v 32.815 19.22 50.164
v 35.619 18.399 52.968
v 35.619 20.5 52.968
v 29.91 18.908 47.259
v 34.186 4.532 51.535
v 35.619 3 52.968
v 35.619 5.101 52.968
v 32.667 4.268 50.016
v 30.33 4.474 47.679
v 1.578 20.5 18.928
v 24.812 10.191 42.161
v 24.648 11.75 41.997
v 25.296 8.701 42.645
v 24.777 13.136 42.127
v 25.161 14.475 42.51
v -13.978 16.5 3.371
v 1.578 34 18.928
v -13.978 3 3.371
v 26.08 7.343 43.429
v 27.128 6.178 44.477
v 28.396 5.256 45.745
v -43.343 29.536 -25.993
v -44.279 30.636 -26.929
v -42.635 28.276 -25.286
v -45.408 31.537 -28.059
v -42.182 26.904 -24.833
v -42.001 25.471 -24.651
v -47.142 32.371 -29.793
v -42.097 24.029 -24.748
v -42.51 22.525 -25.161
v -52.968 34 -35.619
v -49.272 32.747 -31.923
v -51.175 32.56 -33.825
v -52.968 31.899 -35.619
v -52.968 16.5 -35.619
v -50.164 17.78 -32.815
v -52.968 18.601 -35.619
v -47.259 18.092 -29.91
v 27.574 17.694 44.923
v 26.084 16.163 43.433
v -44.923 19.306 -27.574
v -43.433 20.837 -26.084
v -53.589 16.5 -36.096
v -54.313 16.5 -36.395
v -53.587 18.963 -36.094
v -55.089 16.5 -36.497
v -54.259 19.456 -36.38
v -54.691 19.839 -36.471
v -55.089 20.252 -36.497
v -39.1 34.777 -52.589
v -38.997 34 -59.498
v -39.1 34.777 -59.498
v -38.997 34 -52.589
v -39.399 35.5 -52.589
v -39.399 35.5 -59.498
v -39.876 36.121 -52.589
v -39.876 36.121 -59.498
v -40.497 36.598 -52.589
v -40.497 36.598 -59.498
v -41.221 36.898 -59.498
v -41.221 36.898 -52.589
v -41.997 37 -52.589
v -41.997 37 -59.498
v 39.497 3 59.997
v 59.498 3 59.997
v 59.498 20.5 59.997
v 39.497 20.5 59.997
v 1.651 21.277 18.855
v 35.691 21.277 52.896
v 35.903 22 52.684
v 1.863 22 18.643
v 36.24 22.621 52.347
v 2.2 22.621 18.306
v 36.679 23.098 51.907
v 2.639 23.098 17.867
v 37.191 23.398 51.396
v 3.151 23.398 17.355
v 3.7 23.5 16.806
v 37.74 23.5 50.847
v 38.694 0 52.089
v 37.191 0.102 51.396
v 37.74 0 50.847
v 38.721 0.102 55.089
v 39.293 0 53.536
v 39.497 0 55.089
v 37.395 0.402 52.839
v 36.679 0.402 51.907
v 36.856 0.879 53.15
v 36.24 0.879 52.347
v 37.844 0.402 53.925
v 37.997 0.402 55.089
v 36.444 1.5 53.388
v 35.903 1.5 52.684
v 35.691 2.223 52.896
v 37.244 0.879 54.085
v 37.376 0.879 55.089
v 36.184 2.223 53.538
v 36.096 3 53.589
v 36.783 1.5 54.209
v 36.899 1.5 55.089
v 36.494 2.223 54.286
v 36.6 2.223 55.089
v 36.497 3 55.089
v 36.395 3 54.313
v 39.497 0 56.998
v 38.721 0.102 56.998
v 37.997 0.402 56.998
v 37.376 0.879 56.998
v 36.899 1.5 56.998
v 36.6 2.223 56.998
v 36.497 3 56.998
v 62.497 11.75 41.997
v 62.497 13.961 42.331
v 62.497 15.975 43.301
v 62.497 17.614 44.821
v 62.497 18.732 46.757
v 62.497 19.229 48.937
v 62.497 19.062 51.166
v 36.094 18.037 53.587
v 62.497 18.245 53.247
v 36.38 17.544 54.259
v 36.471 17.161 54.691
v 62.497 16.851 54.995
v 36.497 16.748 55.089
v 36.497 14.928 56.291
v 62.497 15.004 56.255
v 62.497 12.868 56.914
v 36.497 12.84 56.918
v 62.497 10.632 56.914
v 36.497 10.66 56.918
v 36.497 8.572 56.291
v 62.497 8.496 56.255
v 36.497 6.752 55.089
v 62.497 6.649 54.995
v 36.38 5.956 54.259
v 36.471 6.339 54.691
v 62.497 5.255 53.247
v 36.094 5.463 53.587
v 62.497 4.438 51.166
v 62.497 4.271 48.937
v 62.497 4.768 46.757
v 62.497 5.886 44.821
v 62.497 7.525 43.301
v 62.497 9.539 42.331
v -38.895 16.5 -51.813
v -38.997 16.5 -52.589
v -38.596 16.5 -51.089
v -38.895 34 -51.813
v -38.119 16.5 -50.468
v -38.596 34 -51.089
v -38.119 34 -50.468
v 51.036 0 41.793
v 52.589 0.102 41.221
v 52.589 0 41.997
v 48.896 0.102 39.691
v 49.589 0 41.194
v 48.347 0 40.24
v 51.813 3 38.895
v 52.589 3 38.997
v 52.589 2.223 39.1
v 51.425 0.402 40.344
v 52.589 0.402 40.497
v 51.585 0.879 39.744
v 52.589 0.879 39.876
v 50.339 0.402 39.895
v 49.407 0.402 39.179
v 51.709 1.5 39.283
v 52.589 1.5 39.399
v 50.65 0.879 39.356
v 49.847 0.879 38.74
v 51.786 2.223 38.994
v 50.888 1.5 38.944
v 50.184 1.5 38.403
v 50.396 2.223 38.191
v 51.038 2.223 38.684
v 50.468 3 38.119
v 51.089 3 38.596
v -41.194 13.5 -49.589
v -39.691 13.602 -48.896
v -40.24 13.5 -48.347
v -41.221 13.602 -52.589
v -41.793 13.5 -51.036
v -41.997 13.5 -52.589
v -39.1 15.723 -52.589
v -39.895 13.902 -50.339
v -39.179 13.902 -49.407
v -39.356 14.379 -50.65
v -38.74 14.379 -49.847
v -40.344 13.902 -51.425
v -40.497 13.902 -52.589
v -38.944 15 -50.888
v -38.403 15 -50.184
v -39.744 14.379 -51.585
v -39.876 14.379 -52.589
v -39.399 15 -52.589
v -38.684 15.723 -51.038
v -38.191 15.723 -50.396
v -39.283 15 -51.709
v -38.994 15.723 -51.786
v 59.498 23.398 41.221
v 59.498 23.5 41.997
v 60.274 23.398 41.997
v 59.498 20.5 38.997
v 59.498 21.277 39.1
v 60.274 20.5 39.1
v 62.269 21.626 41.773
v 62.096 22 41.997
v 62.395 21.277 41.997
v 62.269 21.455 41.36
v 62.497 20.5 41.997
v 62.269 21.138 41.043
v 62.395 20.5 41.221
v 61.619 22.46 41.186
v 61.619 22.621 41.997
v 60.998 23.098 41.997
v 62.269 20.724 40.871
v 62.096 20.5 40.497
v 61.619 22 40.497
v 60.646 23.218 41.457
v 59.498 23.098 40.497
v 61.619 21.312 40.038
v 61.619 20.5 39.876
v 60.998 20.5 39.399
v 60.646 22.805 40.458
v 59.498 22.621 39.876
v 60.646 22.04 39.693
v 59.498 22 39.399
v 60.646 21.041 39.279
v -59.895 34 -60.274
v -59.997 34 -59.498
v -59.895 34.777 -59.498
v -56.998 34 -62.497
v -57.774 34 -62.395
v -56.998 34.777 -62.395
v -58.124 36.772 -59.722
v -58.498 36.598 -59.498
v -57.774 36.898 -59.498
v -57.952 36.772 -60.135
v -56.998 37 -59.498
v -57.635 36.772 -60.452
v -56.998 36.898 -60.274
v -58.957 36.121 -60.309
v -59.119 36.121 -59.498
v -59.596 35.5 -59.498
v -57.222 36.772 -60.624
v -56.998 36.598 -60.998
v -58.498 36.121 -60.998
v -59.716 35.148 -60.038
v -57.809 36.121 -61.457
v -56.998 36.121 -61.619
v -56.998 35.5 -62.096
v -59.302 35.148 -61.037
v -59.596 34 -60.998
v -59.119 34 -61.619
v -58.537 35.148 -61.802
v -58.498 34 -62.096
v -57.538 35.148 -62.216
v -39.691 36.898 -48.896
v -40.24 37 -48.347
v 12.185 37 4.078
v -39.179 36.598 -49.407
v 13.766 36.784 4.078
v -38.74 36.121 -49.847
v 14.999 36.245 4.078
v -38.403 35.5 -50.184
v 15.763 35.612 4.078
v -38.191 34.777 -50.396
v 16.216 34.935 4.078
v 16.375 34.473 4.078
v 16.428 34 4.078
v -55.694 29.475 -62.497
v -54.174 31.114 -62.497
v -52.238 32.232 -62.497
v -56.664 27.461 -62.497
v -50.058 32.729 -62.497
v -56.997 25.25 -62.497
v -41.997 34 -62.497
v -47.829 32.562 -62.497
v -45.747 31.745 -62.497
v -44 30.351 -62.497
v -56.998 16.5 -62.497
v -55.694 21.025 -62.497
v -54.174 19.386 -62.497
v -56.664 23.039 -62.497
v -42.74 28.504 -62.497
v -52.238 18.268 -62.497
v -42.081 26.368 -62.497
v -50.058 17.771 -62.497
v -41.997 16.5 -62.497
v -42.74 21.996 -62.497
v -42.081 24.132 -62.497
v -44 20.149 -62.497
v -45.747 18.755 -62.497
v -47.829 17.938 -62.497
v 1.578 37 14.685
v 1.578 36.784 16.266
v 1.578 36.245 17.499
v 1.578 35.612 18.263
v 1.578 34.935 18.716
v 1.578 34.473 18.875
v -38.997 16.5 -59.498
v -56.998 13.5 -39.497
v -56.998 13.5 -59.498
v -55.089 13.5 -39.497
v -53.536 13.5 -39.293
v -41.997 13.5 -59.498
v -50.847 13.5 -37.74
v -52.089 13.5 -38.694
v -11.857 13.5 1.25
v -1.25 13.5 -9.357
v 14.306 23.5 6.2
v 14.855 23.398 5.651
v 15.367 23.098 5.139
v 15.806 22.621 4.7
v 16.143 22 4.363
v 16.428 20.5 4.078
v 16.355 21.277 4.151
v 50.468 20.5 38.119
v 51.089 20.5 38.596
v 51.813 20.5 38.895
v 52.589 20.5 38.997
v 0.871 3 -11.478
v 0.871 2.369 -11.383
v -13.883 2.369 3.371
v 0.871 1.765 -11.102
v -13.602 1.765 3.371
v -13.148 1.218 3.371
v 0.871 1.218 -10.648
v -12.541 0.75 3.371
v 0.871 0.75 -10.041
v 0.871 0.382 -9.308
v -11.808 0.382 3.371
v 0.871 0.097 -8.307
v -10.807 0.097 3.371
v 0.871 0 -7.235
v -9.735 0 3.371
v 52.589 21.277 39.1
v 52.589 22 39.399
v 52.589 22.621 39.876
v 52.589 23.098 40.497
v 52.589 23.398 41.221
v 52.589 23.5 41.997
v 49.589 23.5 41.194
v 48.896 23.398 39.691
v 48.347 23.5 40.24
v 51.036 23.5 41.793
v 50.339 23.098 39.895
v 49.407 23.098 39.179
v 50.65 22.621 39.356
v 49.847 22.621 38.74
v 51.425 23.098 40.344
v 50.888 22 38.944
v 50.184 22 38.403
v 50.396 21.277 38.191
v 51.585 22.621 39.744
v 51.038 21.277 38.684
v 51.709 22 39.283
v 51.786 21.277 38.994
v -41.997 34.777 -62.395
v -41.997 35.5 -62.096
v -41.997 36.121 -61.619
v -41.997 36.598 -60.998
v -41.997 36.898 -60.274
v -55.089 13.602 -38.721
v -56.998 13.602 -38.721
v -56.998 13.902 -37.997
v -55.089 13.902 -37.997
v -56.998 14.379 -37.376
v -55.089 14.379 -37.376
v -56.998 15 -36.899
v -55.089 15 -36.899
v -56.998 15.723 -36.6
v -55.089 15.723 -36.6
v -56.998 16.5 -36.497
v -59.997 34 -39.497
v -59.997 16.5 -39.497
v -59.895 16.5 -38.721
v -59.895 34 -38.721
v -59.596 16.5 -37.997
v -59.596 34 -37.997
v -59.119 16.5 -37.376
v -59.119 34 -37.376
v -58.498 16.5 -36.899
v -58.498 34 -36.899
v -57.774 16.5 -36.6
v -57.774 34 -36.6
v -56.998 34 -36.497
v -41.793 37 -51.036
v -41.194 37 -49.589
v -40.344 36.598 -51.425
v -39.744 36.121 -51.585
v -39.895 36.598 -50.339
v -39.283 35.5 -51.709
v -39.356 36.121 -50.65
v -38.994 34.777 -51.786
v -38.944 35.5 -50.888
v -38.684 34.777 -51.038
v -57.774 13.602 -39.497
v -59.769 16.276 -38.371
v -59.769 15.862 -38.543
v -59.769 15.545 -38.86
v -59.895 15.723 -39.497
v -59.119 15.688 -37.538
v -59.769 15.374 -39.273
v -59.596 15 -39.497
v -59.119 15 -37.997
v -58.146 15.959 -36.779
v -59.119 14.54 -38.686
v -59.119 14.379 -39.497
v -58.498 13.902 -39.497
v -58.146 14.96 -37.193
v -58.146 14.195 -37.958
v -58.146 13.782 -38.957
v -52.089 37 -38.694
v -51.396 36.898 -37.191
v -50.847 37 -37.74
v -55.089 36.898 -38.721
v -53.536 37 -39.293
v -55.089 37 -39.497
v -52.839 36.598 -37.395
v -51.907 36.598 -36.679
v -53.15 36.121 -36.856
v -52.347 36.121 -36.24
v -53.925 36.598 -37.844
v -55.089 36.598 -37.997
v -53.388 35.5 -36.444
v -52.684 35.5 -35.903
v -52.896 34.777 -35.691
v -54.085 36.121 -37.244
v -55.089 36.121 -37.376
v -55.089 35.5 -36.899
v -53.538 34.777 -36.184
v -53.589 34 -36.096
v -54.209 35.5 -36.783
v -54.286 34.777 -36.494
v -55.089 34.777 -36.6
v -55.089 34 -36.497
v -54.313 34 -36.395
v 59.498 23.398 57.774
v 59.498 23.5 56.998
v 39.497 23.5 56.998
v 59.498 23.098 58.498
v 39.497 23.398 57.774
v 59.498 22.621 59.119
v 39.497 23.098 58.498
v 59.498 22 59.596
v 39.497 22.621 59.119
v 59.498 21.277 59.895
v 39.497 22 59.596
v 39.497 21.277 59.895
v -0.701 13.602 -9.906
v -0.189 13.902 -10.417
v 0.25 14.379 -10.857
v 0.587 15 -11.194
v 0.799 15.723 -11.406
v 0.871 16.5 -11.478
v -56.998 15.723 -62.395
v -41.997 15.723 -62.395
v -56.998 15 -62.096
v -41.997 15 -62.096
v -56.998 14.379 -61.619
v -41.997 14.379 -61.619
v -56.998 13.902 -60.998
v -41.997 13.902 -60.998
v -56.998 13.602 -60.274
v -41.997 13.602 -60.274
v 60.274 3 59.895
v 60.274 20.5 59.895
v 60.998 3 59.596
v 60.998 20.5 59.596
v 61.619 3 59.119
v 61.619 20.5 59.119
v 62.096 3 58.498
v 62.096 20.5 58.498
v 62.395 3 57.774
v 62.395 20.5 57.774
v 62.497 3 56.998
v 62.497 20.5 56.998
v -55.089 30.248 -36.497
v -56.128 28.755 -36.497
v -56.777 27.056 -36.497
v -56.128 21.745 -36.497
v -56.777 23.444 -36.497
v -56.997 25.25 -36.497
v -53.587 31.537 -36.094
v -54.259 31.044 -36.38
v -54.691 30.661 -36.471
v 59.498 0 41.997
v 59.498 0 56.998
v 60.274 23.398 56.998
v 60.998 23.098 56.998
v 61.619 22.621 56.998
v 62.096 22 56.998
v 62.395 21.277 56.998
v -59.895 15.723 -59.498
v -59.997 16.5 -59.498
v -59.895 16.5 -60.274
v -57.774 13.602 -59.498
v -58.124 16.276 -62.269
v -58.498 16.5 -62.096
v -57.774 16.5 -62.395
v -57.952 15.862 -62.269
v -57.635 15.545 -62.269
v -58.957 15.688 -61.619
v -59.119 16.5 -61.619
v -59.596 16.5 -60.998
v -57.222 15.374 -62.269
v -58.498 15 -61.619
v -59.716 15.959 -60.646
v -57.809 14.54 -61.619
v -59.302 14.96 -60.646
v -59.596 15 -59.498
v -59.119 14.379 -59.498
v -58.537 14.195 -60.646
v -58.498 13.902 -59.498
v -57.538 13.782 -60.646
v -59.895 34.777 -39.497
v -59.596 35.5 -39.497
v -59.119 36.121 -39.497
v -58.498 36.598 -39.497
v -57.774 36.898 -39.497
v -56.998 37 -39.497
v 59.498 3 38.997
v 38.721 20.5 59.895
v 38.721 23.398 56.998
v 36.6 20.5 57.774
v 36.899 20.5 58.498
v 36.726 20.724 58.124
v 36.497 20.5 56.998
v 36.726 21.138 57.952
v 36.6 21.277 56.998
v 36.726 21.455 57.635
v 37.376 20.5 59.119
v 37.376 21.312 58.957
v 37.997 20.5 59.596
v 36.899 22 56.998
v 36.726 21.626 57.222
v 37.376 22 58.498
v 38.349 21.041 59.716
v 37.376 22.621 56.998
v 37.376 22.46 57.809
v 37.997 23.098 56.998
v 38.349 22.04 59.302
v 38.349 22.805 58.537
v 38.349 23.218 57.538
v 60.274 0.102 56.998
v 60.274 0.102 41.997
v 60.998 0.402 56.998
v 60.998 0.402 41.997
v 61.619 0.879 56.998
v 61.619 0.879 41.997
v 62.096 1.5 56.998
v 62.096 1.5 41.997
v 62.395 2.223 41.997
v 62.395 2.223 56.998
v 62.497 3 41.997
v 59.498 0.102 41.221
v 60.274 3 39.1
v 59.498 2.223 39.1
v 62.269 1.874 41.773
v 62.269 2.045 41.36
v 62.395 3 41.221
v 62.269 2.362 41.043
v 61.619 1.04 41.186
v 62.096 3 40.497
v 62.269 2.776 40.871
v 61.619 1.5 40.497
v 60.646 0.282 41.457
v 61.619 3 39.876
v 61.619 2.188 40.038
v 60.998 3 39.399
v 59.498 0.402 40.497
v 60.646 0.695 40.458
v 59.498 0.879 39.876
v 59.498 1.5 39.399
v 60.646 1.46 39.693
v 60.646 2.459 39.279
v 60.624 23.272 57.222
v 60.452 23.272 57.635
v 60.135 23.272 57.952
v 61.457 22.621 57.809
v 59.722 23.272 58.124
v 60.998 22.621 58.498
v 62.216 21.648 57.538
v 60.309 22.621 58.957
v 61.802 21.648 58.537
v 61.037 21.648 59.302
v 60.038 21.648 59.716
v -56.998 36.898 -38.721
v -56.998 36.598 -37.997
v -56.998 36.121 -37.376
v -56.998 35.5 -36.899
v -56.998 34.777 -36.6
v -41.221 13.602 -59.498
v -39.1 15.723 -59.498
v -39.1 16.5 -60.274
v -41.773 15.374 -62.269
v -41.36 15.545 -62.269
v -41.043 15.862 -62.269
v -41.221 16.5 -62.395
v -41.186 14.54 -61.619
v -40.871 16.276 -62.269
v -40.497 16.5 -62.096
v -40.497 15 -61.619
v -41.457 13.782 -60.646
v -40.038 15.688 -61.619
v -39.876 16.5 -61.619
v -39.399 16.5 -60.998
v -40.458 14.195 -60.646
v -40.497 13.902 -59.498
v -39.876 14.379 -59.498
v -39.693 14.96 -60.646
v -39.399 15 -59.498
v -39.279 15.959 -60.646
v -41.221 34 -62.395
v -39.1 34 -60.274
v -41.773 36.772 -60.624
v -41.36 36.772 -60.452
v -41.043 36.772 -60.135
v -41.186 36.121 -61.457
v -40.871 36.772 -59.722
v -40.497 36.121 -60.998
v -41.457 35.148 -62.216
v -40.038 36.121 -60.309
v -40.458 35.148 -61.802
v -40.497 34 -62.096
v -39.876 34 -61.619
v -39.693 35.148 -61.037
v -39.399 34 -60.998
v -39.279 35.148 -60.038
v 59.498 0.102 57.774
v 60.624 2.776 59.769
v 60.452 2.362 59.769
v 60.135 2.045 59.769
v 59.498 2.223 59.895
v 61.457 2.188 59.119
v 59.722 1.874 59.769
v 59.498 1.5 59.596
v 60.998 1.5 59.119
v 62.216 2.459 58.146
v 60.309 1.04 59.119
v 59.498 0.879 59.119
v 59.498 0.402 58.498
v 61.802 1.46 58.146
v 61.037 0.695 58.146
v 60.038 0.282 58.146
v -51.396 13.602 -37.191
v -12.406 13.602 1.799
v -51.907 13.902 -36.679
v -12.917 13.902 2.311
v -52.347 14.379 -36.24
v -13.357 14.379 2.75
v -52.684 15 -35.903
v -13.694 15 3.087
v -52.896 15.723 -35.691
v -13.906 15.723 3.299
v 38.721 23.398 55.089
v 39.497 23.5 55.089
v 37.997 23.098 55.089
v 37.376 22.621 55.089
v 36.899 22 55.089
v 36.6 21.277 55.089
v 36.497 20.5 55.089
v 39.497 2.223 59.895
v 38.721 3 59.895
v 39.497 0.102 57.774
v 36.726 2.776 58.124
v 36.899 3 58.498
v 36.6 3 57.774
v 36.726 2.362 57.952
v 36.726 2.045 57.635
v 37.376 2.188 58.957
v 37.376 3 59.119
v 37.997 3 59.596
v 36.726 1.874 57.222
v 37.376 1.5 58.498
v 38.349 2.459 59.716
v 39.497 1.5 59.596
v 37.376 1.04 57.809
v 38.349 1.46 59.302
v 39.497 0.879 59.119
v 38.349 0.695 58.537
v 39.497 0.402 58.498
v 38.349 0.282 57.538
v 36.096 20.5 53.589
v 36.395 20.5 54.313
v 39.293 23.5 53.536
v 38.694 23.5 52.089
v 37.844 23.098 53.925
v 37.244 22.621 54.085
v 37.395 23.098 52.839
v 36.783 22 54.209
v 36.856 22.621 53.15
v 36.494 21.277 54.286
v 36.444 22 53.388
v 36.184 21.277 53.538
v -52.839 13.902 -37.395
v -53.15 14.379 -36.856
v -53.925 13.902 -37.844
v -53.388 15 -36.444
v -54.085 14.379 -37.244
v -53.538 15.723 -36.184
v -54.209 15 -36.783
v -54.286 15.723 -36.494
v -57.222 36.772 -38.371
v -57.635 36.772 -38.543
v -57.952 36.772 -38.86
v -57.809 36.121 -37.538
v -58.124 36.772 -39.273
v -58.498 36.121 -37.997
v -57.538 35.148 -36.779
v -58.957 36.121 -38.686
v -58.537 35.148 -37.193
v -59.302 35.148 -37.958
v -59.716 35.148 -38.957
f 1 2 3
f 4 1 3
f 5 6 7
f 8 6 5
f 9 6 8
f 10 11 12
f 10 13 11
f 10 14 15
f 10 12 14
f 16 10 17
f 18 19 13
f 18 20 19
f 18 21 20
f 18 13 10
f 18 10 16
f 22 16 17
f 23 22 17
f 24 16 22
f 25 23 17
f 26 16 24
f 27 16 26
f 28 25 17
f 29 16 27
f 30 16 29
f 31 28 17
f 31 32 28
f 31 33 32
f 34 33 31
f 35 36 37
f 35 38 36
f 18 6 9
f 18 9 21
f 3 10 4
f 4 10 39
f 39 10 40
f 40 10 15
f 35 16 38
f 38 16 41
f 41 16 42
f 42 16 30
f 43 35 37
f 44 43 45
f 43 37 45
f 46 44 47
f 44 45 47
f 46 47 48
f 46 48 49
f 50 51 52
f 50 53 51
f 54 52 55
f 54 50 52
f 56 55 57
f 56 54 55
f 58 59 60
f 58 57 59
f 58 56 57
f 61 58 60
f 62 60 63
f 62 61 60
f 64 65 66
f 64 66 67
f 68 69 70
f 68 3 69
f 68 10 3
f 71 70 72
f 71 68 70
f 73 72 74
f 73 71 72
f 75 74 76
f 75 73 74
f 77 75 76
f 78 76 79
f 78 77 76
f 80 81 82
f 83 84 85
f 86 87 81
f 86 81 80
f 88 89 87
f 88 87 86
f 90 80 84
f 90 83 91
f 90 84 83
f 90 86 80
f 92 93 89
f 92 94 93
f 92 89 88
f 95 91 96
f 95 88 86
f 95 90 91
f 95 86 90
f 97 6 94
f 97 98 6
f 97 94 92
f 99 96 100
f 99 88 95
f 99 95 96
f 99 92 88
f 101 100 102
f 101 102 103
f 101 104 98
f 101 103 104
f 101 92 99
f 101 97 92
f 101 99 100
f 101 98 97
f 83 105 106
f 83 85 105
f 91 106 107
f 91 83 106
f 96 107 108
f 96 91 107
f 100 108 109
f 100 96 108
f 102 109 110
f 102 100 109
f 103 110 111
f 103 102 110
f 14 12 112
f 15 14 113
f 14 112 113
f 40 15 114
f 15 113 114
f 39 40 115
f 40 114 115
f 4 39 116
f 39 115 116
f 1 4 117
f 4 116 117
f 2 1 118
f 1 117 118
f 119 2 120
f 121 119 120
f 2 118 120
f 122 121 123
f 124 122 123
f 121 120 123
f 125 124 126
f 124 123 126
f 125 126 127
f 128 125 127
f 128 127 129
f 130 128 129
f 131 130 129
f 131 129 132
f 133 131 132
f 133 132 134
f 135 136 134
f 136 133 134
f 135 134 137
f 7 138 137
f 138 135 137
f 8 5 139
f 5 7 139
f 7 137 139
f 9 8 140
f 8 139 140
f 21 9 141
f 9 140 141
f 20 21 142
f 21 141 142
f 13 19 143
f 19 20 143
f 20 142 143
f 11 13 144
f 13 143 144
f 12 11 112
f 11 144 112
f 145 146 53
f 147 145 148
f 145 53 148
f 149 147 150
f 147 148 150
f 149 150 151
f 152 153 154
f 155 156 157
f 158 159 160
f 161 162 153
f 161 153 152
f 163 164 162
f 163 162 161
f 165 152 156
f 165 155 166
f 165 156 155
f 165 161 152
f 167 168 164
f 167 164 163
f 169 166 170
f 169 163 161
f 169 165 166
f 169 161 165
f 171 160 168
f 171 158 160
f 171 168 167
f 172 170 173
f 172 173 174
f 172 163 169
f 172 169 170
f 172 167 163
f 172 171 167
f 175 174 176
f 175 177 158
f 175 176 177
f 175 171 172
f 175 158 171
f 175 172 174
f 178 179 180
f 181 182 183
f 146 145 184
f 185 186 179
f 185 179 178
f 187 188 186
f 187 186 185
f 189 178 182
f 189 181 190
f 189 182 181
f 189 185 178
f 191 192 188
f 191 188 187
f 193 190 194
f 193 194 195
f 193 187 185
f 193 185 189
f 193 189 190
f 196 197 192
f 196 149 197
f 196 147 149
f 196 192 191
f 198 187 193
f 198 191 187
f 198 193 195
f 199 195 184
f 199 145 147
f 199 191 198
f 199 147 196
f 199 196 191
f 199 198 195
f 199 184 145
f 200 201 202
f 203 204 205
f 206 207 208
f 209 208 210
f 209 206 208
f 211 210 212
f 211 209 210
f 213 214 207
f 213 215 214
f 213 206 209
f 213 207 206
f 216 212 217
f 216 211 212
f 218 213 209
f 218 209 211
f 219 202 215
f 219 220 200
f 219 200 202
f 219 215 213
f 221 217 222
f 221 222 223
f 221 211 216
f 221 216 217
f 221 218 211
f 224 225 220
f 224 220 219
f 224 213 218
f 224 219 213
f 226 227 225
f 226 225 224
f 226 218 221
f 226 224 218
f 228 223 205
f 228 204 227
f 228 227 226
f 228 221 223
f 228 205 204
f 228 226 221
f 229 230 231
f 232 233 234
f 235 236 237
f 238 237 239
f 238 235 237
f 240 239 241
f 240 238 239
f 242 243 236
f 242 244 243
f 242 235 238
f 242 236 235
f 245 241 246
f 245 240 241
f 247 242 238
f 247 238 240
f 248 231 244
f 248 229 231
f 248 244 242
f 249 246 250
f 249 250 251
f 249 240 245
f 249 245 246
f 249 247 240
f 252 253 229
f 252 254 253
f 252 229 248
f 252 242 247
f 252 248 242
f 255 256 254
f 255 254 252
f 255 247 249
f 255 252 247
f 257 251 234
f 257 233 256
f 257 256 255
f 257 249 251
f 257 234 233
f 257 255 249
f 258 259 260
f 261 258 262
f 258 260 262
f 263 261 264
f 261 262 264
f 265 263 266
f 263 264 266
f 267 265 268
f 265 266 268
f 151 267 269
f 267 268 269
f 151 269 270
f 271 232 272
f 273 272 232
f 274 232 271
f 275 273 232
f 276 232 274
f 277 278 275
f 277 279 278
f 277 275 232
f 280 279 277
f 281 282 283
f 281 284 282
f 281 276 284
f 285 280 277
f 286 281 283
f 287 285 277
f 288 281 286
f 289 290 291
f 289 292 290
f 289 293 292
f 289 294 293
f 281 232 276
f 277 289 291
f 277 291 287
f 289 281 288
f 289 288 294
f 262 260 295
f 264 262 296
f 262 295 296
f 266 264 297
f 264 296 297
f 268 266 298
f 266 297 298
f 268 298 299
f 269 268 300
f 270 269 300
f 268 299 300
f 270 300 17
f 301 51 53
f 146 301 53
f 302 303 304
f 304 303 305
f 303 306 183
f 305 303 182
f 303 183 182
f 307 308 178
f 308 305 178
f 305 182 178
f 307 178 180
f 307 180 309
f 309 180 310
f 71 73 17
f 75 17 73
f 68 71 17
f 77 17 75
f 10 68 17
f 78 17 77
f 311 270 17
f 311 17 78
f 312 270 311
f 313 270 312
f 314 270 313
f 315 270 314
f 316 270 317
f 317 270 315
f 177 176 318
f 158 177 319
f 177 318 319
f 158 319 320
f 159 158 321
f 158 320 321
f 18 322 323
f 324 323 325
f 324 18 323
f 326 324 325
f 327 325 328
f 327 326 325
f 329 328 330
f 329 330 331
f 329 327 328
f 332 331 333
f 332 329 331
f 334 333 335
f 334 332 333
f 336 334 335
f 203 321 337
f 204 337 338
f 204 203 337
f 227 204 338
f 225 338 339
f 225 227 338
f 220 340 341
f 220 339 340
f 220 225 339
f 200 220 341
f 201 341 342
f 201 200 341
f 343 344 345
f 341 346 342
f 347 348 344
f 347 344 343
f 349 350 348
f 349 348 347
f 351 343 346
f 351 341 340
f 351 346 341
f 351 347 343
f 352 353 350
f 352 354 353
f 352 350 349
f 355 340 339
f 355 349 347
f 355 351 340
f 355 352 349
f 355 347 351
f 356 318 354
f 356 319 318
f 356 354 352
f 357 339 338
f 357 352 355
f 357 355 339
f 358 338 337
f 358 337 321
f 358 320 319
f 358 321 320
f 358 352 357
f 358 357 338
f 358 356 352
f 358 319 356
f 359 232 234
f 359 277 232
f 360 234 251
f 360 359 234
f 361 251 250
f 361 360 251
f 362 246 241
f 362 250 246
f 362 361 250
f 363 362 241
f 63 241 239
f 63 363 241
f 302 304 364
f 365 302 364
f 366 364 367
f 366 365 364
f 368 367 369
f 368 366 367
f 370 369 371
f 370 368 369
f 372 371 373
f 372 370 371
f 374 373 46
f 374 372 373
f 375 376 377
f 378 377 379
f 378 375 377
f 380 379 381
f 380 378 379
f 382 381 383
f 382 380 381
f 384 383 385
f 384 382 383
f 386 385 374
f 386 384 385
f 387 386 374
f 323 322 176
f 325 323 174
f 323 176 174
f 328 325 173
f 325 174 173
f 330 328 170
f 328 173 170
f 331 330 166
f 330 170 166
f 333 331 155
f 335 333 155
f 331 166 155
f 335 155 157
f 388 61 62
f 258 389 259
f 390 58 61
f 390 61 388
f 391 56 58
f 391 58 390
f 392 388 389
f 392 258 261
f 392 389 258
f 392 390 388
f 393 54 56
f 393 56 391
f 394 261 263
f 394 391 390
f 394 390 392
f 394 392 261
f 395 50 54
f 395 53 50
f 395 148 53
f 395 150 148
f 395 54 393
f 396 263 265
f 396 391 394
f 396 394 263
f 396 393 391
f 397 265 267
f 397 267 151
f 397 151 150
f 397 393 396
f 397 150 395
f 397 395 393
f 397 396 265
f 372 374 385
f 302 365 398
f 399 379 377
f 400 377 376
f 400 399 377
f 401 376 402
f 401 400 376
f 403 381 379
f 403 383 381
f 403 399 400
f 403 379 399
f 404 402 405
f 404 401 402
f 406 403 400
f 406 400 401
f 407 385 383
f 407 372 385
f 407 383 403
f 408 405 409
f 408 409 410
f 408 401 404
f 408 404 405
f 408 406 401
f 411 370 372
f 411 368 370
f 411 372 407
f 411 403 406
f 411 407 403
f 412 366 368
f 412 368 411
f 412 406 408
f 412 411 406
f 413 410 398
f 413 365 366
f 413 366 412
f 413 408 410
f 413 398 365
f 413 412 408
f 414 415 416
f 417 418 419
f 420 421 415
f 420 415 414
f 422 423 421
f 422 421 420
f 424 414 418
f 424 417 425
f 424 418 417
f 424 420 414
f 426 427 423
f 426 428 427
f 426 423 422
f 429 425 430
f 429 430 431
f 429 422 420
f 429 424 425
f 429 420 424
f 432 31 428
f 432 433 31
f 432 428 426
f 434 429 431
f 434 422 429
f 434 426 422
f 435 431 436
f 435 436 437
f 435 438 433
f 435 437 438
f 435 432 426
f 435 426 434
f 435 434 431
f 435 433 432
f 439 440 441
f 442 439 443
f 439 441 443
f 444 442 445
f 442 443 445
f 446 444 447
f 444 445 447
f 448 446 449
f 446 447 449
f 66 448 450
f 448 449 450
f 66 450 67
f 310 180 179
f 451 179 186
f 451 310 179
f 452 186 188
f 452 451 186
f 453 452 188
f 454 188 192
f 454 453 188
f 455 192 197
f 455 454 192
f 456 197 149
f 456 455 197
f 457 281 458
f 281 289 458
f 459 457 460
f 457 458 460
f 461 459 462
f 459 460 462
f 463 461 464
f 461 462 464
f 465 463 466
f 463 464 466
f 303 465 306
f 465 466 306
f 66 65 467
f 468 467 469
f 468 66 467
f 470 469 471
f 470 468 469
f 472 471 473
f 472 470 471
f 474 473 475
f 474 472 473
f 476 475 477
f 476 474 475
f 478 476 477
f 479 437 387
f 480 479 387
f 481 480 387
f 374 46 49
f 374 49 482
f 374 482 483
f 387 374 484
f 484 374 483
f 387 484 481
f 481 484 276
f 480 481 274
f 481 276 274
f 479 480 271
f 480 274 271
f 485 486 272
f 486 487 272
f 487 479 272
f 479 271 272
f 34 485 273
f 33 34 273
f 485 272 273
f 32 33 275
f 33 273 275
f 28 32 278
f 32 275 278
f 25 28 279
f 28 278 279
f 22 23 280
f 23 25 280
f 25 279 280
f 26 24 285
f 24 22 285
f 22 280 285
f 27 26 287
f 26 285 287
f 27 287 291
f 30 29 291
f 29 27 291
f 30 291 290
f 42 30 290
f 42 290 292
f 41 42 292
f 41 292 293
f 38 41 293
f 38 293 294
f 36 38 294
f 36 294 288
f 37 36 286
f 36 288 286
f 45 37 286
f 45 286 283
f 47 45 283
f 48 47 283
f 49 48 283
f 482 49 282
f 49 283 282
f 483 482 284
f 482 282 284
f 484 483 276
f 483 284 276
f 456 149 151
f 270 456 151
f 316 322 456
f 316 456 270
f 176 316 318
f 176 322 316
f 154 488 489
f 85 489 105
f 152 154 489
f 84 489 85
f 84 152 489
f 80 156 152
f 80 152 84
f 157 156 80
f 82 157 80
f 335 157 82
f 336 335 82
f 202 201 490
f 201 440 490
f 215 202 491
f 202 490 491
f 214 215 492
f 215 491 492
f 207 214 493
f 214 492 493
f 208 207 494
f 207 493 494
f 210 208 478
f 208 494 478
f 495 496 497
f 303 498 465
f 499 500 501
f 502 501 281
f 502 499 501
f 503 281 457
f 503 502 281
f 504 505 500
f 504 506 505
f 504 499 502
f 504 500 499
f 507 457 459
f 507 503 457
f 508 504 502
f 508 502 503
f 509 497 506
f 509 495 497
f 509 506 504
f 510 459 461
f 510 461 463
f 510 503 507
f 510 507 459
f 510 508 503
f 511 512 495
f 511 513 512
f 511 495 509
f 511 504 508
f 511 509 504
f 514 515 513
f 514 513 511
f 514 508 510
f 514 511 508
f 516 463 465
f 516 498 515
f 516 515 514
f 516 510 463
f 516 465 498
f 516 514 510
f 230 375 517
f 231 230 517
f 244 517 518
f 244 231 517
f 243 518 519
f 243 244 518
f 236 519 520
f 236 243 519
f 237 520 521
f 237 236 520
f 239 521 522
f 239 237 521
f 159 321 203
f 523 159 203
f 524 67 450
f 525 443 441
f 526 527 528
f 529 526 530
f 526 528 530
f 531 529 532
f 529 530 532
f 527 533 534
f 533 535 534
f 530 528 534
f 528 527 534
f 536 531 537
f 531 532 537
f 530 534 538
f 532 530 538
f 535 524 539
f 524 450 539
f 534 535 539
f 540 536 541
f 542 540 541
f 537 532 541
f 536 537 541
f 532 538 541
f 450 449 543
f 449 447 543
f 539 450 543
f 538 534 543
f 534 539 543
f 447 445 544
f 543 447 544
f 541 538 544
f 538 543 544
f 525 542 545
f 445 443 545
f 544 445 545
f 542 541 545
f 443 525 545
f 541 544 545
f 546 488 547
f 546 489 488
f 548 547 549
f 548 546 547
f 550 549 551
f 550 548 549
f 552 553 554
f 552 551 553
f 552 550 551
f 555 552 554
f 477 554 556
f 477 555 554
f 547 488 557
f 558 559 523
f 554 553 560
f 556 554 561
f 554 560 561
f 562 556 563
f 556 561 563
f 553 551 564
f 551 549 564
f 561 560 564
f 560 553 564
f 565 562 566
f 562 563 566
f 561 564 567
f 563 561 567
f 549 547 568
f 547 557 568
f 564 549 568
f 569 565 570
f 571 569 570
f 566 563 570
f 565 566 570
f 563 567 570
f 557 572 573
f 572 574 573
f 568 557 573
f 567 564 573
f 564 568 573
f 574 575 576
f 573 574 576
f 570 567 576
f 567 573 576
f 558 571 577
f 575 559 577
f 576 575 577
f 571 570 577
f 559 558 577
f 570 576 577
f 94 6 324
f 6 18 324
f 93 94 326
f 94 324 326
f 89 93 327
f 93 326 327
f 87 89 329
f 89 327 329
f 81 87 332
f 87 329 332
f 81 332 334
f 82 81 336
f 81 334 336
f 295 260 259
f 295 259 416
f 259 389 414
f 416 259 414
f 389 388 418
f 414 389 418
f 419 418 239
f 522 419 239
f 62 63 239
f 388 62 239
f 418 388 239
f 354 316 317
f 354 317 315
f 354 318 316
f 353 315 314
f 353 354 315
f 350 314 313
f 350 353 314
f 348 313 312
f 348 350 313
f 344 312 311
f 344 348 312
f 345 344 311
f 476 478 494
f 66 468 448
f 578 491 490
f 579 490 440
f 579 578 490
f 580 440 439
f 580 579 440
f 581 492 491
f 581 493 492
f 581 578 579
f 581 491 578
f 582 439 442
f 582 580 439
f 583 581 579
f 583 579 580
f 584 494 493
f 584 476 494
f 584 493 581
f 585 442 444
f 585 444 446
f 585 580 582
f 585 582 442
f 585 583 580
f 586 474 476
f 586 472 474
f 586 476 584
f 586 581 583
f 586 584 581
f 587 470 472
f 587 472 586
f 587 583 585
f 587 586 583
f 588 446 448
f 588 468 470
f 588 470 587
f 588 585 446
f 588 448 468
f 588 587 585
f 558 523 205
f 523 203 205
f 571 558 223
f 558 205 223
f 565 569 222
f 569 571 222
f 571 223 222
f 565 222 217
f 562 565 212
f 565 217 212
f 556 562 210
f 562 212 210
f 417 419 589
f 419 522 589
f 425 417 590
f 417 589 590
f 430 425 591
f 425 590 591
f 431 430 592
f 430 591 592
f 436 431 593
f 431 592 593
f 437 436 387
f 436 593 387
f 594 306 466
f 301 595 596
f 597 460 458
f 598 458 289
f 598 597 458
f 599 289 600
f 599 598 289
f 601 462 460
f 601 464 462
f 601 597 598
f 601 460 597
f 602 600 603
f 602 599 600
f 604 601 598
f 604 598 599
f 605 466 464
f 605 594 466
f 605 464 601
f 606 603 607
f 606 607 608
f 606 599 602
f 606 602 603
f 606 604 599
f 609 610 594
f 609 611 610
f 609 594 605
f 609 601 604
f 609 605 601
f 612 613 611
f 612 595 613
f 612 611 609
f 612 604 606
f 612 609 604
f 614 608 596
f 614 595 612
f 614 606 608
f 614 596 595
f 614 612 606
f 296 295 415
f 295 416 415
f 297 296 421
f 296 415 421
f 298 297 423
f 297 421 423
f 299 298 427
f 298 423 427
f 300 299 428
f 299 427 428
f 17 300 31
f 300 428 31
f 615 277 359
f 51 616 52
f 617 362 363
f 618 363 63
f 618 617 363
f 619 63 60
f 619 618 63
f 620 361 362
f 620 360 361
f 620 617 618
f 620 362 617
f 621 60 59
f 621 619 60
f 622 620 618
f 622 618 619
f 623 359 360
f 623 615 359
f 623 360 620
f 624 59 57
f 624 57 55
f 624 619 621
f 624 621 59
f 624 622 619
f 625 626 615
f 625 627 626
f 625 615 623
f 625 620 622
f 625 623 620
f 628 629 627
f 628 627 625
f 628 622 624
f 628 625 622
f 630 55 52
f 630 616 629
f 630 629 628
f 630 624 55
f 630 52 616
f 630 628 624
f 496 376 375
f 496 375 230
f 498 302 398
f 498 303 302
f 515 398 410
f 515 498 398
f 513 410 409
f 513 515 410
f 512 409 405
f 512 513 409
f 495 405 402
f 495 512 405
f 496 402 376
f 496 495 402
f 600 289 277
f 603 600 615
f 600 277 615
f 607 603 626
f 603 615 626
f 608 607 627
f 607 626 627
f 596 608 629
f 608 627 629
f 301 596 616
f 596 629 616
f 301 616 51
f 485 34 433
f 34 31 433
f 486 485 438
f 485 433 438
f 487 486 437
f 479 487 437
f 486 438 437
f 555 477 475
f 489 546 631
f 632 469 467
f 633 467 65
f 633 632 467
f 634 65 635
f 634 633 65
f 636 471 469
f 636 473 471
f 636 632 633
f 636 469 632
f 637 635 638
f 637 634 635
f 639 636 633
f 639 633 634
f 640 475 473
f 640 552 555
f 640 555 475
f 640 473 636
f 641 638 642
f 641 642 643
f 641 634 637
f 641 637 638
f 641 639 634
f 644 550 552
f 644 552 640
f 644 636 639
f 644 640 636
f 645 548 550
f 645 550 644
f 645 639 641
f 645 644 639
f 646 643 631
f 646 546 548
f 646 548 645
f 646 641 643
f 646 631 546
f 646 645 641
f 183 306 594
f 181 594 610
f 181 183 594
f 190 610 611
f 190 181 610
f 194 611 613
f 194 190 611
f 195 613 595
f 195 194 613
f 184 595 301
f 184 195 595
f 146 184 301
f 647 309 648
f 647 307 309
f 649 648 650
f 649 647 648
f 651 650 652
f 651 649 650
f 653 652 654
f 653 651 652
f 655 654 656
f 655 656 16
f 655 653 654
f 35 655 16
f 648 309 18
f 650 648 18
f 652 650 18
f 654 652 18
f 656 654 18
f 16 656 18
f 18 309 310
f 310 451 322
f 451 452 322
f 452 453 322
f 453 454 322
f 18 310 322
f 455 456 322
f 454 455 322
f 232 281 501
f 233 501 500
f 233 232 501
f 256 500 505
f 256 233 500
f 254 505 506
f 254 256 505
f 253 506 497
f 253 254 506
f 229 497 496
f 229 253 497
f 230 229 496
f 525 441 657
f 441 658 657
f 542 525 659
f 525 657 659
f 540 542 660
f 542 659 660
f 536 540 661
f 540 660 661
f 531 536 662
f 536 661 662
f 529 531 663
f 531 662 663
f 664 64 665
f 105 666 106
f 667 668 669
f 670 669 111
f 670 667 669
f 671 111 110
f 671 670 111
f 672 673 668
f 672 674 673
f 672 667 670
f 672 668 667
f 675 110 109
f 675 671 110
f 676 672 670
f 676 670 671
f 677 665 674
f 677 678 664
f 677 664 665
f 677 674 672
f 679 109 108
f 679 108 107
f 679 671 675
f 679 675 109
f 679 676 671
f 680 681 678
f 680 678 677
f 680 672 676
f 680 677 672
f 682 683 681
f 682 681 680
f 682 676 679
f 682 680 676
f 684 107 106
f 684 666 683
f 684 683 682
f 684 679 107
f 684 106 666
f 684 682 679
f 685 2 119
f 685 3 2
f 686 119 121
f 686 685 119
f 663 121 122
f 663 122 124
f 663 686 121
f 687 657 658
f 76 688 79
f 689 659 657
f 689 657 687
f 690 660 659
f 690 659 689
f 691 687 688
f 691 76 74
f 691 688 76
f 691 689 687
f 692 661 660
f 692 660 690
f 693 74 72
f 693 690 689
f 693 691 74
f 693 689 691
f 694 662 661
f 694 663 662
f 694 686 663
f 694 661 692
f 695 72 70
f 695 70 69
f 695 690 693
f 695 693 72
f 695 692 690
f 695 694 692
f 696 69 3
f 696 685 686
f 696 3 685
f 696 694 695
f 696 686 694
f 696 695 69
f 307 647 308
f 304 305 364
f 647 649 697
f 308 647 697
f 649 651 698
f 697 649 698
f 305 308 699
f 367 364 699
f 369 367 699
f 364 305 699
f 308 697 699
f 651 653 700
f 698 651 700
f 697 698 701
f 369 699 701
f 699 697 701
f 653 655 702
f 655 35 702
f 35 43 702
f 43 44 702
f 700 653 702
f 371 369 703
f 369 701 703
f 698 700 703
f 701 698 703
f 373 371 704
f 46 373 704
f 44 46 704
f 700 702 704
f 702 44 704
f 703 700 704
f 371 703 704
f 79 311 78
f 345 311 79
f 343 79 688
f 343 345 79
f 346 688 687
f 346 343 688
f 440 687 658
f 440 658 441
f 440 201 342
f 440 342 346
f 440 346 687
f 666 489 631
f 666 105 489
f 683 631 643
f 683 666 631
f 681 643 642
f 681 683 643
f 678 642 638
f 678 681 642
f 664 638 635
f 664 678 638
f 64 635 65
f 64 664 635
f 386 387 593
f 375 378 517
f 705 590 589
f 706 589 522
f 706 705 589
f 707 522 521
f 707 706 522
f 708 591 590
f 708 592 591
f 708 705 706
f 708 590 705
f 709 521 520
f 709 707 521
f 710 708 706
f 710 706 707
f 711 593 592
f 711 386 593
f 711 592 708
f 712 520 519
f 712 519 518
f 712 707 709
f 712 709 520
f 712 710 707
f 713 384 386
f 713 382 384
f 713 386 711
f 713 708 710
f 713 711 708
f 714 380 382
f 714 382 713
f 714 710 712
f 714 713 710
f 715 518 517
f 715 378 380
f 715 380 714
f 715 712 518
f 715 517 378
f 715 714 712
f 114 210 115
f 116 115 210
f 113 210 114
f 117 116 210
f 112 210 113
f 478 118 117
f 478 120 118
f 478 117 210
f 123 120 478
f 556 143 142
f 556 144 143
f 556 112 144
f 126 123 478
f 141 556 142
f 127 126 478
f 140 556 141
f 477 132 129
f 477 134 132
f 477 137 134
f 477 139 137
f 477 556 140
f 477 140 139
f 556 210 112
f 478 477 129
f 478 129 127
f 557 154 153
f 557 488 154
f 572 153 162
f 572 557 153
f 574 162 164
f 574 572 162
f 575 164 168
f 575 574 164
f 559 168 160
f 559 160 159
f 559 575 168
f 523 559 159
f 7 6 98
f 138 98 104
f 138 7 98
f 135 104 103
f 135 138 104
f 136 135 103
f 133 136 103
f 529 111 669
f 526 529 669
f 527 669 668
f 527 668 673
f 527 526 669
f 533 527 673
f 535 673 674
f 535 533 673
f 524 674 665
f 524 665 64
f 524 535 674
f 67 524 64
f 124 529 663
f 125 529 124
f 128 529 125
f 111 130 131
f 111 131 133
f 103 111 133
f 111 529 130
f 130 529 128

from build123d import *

# Parameters (mm, degrees)
BOSS_EXTRUDE1_DEPTH     = 37
CUT_EXTRUDE1_DEPTH      = 101.656930314
CUT_EXTRUDE1_DEPTH_BACK = 101.656930314
SKETCH6_R               = 7.5
CUT_EXTRUDE2_DEPTH      = 143.407678732
SKETCH7_R               = 7.5
CUT_EXTRUDE3_DEPTH      = 143.407678732
FILLET1_R               = 3


with BuildPart() as part:
    # Sketch3 → Boss-Extrude1 (new body)
    with BuildSketch(Plane(origin=(0, 0, 0), x_dir=(1, 0, 0), z_dir=(0, 1, 0))):
        Polygon((-59.997474683, 62.497474683), (-38.997474683, 62.497474683), (-38.997474683, 51.346717088), (51.346717088, -38.997474683), (62.497474683, -38.997474683), (62.497474683, -59.997474683), (36.497474683, -59.997474683), (36.497474683, -53.846717088), (-53.846717088, 36.497474683), (-59.997474683, 36.497474683), align=None)
    extrude(amount=BOSS_EXTRUDE1_DEPTH)

    # Sketch5 → Cut-Extrude1 (cut, two sides: drawn at the far end of the back side and taken through both)
    with BuildSketch(Plane(origin=(7.806349186, 0, -4.542893219), x_dir=(0.7071067811865459, 0, 0.7071067811865491), z_dir=(-0.7071067811865491, 0, 0.7071067811865459)).offset(-CUT_EXTRUDE1_DEPTH_BACK)):
        Polygon((61.575378798, 37), (12.192388155, 37), (12.192388155, 23.5), (84.309397513, 23.5), (84.309397513, 37), (69.460155108, 37), align=None)
        Polygon((-9.807611845, 0), (-66.190602487, 0), (-74.075378798, 0), (-88.924621202, 0), (-88.924621202, 13.5), (-9.807611845, 13.5), align=None)
    extrude(amount=CUT_EXTRUDE1_DEPTH + CUT_EXTRUDE1_DEPTH_BACK, mode=Mode.SUBTRACT)

    # Sketch6 → Cut-Extrude2 (cut, through all)
    with BuildSketch(Plane(origin=(62.497474683, 0, 0), x_dir=(0, 0, -1), z_dir=(1, 0, 0))):
        with Locations((-49.497474683, 11.75)):
            Circle(SKETCH6_R)
    extrude(amount=-CUT_EXTRUDE2_DEPTH, mode=Mode.SUBTRACT)

    # Sketch7 → Cut-Extrude3 (cut, through all)
    with BuildSketch(Plane(origin=(0, 0, -62.497474683), x_dir=(-1, 0, 0), z_dir=(0, 0, -1))):
        with Locations((49.497474683, 25.25)):
            Circle(SKETCH7_R)
    extrude(amount=-CUT_EXTRUDE3_DEPTH, mode=Mode.SUBTRACT)

    # Fillet1
    fillet1_edges = [part.edges().sort_by_distance(p)[0] for p in [
        (56.922095886, 0, 38.997474683),
        (56.922095886, 23.5, 38.997474683),
        (-38.997474683, 25.25, -51.346717088),
        (26.109018716, 0, 13.759776311),
        (51.346717088, 11.75, 38.997474683),
        (33.887193309, 23.5, 21.537950904),
        (62.497474683, 0, 49.497474683),
        (62.497474683, 11.75, 59.997474683),
        (62.497474683, 23.5, 49.497474683),
        (62.497474683, 11.75, 38.997474683),
        (-6.553300859, 0, -4.053300859),
        (-33.912319575, 13.5, -16.56307717),
        (-19.06307717, 13.5, -31.412319575),
        (-38.997474683, 13.5, -56.922095886),
        (-56.922095886, 13.5, -36.497474683),
        (-59.997474683, 25.25, -36.497474683),
        (-59.997474683, 13.5, -49.497474683),
        (-59.997474683, 25.25, -62.497474683),
        (-49.497474683, 13.5, -62.497474683),
        (-38.997474683, 25.25, -62.497474683),
        (-26.134144982, 37, -8.784902577),
        (-56.922095886, 37, -36.497474683),
        (-59.997474683, 37, -49.497474683),
        (-49.497474683, 37, -62.497474683),
        (-38.997474683, 37, -56.922095886),
        (-11.284902577, 37, -23.634144982),
        (9.003048327, 37, 11.503048327),
        (19.037950904, 23.5, 36.387193309),
        (11.259776311, 0, 28.609018716),
        (49.497474683, 0, 59.997474683),
        (49.497474683, 23.5, 59.997474683),
        (36.497474683, 11.75, 59.997474683),
        (36.497474683, 0, 56.922095886),
        (-53.846717088, 16.319918557, -36.497474683),
        (-53.846717088, 34.180081443, -36.497474683),
        (36.497474683, 20.680081443, 53.846717088),
        (36.497474683, 2.819918557, 53.846717088),
        (36.497474683, 23.5, 56.922095886),
    ]]
    fillet(fillet1_edges, radius=FILLET1_R - 0.0001)  # a hair under: the kernel refuses the full size


solid = part.part
